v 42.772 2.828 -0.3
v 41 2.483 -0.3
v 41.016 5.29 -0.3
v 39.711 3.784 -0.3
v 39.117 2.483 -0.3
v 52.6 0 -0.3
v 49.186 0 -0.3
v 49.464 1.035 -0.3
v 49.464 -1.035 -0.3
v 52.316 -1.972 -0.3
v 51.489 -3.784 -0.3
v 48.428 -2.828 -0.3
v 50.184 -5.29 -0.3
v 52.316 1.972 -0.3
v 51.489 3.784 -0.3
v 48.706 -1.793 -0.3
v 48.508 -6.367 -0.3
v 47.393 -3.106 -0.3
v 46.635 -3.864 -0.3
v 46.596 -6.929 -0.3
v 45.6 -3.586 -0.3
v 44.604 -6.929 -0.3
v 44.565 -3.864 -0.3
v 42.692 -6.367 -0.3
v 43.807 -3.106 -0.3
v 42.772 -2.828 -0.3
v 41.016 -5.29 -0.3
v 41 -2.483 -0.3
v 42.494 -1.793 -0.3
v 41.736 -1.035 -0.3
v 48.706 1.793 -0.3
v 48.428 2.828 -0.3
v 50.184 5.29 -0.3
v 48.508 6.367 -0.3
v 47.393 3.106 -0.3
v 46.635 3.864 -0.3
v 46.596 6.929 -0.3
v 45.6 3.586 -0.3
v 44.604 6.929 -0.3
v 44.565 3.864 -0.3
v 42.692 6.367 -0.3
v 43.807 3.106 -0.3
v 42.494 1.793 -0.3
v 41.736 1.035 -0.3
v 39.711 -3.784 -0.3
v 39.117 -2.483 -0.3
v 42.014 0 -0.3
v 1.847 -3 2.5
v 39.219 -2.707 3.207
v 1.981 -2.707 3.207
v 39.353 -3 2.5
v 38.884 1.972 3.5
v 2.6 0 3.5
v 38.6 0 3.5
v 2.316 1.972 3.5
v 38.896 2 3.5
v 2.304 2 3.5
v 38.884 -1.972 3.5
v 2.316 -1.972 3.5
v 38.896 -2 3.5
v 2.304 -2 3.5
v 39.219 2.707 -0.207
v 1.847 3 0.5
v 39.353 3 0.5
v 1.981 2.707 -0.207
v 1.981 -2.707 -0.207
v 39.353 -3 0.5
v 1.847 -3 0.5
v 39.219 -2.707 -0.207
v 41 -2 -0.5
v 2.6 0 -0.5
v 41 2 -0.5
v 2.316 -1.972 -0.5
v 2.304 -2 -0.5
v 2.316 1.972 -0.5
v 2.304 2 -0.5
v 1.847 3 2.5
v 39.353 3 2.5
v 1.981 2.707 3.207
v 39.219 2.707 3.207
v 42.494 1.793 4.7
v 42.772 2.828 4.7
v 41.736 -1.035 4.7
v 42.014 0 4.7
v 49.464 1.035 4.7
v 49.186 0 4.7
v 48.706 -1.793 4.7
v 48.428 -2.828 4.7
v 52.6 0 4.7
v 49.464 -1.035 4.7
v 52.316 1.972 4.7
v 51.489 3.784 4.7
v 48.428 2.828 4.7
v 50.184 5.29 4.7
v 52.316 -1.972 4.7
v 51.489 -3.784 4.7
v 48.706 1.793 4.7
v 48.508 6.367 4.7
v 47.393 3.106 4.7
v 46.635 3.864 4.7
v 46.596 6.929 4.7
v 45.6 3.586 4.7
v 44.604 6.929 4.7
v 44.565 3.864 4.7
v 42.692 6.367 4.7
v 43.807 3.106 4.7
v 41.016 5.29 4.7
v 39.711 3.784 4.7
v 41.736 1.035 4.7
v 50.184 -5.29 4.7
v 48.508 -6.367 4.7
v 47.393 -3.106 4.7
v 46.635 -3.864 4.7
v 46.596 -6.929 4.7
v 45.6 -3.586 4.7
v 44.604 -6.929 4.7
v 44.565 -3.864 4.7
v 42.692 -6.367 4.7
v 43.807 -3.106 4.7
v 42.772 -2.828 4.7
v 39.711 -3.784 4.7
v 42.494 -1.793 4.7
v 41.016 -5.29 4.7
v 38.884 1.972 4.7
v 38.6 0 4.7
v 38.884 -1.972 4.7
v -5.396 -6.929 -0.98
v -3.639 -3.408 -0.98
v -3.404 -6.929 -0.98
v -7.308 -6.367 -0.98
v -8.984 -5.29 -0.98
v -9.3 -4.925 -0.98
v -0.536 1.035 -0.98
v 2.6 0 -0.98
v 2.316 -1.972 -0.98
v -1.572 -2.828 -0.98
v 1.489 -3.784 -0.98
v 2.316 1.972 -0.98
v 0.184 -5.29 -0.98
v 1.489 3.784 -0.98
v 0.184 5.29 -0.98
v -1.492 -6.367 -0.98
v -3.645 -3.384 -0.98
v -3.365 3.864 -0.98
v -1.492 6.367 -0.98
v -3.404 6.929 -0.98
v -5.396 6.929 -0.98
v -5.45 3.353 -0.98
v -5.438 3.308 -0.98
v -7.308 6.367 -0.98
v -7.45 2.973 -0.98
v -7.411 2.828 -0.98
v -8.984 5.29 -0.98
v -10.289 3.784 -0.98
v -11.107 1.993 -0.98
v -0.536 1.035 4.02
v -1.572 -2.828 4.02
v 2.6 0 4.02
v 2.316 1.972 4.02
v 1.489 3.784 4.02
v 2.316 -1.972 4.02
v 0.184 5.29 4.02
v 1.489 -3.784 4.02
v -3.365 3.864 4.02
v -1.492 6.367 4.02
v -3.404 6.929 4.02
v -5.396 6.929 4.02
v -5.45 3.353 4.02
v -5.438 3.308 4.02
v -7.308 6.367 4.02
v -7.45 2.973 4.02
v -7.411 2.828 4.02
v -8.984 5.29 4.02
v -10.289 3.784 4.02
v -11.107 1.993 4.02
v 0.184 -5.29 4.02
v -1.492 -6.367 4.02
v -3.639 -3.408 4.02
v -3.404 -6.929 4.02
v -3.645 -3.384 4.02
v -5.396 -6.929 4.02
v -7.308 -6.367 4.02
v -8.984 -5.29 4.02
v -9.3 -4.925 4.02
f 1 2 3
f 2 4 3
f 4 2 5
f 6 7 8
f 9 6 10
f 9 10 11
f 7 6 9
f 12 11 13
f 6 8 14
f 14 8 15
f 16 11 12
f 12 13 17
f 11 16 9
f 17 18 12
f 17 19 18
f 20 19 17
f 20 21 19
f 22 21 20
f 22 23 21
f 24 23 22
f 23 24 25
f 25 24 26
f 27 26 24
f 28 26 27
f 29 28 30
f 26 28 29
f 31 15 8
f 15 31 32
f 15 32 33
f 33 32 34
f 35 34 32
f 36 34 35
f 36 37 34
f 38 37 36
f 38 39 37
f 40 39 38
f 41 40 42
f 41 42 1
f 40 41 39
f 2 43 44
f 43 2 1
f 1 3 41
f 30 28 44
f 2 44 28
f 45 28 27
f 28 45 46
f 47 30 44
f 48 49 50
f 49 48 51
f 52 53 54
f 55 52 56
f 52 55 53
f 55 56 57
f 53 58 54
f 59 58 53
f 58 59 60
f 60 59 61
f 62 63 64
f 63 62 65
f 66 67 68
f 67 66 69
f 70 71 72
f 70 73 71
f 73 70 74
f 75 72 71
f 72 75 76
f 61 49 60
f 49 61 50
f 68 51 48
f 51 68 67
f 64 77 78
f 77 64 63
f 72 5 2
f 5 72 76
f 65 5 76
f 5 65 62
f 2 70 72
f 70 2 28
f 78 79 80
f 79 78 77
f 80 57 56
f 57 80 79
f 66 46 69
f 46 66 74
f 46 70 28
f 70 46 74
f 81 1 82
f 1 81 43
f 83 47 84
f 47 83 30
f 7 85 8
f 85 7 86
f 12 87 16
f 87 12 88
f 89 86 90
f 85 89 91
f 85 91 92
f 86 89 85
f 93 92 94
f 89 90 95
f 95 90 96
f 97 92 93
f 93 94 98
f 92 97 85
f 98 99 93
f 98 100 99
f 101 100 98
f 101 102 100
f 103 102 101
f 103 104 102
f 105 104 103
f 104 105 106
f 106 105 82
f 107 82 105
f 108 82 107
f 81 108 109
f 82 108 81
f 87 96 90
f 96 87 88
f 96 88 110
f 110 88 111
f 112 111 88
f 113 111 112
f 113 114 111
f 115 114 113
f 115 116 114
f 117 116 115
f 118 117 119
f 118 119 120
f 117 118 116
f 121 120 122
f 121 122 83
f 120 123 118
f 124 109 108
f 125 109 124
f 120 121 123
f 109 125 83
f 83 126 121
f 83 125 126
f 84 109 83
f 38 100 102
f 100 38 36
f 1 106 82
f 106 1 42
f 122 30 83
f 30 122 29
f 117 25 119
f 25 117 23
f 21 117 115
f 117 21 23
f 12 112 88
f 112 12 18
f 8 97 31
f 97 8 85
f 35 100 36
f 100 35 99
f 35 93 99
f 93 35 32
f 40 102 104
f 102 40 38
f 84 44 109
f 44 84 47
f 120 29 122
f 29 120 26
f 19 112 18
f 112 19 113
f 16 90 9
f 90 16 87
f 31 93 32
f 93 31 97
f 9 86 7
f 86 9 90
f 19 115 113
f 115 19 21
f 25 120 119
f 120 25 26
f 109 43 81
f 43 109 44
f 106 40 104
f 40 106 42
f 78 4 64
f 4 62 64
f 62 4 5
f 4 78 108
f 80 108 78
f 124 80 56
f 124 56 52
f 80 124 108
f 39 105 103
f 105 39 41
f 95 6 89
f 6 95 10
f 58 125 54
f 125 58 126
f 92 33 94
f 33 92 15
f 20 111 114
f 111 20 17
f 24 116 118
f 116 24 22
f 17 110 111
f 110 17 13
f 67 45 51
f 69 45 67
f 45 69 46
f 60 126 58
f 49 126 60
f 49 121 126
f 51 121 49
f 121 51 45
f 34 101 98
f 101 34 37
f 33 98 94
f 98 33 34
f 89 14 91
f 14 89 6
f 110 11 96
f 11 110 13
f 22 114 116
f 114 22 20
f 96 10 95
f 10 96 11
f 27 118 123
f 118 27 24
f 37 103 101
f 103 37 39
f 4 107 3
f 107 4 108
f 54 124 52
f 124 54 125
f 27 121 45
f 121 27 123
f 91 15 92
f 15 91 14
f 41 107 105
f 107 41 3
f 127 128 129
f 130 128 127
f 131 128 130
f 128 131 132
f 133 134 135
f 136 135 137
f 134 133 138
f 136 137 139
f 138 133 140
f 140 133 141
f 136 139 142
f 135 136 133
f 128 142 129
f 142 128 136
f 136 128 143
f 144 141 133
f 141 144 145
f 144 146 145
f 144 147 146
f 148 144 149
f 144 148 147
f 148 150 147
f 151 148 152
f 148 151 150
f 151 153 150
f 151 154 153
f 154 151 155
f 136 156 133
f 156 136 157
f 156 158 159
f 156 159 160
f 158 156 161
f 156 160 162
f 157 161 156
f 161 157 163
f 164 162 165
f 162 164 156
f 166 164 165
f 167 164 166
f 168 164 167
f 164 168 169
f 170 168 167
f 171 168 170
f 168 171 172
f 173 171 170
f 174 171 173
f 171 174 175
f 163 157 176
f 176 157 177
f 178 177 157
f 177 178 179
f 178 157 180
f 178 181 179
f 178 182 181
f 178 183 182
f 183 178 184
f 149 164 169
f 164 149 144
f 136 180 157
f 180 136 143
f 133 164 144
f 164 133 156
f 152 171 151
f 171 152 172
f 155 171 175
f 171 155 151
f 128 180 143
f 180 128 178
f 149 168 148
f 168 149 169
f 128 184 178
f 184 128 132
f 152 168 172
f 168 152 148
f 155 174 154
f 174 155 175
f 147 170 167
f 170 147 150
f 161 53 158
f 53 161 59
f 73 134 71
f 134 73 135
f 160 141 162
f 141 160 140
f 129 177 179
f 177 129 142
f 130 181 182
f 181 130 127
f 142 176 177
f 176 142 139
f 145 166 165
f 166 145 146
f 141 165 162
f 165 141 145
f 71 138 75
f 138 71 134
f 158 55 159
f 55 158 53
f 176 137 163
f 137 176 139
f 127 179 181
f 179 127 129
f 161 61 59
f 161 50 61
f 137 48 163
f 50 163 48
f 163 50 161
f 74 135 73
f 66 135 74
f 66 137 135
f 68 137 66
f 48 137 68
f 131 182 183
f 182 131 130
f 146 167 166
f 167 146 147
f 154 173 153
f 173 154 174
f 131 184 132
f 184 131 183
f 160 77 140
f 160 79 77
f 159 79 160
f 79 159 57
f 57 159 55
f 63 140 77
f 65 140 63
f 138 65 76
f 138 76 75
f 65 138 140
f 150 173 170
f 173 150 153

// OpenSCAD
//Customizable Combination Wrench 
//

//Change these constants for other sizes/etc. All measurements in mm.

size=4; //ideally between 2-50

height=2; //4;  3 for size<=6;

length=10*size; // 5*size; 60 for size>=10

insert=0; //thickness of any additional material which will be used in the ends. Leave 0 if not attempting to strengthen.

box_offset = 0; // .4*(height-1);
box_rot=0; // -15 default

/////////////////////////////////////

////////////////////////////////////////

union(){

difference(){
shaft();
translate([(length+size),0,-0.15*height])
union(){
rotate([0,0,15])
linear_extrude(2*height+1)
circle(size+insert,$fn=6);
rotate([0,0,105])
linear_extrude(2*height+1)
circle(size+insert,$fn=6);
rotate([0,0,195])
linear_extrude(2*height+1)
circle(size+insert,$fn=6);
}

}

//smaller sizes l+1.4size, -.15height
//bigger l+1.2size, 0.1height
translate([(length+1.4*size),0,-0.15*height])
box_end();

translate([-1.1*size,0,0.01*height])
open_end();
}


//////////////////////////////////////////////////
module open_end(){
translate([0,0,-0.25*(height+2)])
difference(){
linear_extrude(2*height+1)
//smaller sizes +3
//>10 +5
circle(size+insert+3);

union(){
rotate([0,0,15])
linear_extrude(2*height+1)
circle(size+insert,$fn=6);

linear_extrude(2*height+1)
//small sizes -2* and -1.4*
//bigger/default -1.5* and -1.305*
translate([-2*size,-1.4*size,0])
rotate([0,0,15])
square(1.75*(size+insert));

linear_extrude(2*height+1)
translate([-1.5*size,-1.305*size,0])
rotate([0,0,15])
square(1.75*(size+insert));
}
}
}
////////////////////////////////////////////////////
module box_end(){

translate([0,0,box_offset])
rotate([0,box_rot,0])
difference(){
linear_extrude(2*height+1)
//smaller +3, bigger +3.5
circle(size+insert+3);

union(){
rotate([0,0,15])
linear_extrude(2*height+1)
circle(size+insert,$fn=6);
rotate([0,0,105])
linear_extrude(2*height+1)
circle(size+insert,$fn=6);
rotate([0,0,195])
linear_extrude(2*height+1)
circle(size+insert,$fn=6);

}
}
}
///////////////////////////////////////////////////////////////
module shaft(){
minkowski(){
cube([length, size, height]);
translate([0,-size/2,size/8])
rotate([0,90,0])
cylinder(r=height/2,h=1,$fn=8);
}
}
/////////////////////////////////////////////
module cleanup(){
translate([length-2,-size+2,-(height+2)])
cube([size+2,size+2,3*(height+2)]);
}
